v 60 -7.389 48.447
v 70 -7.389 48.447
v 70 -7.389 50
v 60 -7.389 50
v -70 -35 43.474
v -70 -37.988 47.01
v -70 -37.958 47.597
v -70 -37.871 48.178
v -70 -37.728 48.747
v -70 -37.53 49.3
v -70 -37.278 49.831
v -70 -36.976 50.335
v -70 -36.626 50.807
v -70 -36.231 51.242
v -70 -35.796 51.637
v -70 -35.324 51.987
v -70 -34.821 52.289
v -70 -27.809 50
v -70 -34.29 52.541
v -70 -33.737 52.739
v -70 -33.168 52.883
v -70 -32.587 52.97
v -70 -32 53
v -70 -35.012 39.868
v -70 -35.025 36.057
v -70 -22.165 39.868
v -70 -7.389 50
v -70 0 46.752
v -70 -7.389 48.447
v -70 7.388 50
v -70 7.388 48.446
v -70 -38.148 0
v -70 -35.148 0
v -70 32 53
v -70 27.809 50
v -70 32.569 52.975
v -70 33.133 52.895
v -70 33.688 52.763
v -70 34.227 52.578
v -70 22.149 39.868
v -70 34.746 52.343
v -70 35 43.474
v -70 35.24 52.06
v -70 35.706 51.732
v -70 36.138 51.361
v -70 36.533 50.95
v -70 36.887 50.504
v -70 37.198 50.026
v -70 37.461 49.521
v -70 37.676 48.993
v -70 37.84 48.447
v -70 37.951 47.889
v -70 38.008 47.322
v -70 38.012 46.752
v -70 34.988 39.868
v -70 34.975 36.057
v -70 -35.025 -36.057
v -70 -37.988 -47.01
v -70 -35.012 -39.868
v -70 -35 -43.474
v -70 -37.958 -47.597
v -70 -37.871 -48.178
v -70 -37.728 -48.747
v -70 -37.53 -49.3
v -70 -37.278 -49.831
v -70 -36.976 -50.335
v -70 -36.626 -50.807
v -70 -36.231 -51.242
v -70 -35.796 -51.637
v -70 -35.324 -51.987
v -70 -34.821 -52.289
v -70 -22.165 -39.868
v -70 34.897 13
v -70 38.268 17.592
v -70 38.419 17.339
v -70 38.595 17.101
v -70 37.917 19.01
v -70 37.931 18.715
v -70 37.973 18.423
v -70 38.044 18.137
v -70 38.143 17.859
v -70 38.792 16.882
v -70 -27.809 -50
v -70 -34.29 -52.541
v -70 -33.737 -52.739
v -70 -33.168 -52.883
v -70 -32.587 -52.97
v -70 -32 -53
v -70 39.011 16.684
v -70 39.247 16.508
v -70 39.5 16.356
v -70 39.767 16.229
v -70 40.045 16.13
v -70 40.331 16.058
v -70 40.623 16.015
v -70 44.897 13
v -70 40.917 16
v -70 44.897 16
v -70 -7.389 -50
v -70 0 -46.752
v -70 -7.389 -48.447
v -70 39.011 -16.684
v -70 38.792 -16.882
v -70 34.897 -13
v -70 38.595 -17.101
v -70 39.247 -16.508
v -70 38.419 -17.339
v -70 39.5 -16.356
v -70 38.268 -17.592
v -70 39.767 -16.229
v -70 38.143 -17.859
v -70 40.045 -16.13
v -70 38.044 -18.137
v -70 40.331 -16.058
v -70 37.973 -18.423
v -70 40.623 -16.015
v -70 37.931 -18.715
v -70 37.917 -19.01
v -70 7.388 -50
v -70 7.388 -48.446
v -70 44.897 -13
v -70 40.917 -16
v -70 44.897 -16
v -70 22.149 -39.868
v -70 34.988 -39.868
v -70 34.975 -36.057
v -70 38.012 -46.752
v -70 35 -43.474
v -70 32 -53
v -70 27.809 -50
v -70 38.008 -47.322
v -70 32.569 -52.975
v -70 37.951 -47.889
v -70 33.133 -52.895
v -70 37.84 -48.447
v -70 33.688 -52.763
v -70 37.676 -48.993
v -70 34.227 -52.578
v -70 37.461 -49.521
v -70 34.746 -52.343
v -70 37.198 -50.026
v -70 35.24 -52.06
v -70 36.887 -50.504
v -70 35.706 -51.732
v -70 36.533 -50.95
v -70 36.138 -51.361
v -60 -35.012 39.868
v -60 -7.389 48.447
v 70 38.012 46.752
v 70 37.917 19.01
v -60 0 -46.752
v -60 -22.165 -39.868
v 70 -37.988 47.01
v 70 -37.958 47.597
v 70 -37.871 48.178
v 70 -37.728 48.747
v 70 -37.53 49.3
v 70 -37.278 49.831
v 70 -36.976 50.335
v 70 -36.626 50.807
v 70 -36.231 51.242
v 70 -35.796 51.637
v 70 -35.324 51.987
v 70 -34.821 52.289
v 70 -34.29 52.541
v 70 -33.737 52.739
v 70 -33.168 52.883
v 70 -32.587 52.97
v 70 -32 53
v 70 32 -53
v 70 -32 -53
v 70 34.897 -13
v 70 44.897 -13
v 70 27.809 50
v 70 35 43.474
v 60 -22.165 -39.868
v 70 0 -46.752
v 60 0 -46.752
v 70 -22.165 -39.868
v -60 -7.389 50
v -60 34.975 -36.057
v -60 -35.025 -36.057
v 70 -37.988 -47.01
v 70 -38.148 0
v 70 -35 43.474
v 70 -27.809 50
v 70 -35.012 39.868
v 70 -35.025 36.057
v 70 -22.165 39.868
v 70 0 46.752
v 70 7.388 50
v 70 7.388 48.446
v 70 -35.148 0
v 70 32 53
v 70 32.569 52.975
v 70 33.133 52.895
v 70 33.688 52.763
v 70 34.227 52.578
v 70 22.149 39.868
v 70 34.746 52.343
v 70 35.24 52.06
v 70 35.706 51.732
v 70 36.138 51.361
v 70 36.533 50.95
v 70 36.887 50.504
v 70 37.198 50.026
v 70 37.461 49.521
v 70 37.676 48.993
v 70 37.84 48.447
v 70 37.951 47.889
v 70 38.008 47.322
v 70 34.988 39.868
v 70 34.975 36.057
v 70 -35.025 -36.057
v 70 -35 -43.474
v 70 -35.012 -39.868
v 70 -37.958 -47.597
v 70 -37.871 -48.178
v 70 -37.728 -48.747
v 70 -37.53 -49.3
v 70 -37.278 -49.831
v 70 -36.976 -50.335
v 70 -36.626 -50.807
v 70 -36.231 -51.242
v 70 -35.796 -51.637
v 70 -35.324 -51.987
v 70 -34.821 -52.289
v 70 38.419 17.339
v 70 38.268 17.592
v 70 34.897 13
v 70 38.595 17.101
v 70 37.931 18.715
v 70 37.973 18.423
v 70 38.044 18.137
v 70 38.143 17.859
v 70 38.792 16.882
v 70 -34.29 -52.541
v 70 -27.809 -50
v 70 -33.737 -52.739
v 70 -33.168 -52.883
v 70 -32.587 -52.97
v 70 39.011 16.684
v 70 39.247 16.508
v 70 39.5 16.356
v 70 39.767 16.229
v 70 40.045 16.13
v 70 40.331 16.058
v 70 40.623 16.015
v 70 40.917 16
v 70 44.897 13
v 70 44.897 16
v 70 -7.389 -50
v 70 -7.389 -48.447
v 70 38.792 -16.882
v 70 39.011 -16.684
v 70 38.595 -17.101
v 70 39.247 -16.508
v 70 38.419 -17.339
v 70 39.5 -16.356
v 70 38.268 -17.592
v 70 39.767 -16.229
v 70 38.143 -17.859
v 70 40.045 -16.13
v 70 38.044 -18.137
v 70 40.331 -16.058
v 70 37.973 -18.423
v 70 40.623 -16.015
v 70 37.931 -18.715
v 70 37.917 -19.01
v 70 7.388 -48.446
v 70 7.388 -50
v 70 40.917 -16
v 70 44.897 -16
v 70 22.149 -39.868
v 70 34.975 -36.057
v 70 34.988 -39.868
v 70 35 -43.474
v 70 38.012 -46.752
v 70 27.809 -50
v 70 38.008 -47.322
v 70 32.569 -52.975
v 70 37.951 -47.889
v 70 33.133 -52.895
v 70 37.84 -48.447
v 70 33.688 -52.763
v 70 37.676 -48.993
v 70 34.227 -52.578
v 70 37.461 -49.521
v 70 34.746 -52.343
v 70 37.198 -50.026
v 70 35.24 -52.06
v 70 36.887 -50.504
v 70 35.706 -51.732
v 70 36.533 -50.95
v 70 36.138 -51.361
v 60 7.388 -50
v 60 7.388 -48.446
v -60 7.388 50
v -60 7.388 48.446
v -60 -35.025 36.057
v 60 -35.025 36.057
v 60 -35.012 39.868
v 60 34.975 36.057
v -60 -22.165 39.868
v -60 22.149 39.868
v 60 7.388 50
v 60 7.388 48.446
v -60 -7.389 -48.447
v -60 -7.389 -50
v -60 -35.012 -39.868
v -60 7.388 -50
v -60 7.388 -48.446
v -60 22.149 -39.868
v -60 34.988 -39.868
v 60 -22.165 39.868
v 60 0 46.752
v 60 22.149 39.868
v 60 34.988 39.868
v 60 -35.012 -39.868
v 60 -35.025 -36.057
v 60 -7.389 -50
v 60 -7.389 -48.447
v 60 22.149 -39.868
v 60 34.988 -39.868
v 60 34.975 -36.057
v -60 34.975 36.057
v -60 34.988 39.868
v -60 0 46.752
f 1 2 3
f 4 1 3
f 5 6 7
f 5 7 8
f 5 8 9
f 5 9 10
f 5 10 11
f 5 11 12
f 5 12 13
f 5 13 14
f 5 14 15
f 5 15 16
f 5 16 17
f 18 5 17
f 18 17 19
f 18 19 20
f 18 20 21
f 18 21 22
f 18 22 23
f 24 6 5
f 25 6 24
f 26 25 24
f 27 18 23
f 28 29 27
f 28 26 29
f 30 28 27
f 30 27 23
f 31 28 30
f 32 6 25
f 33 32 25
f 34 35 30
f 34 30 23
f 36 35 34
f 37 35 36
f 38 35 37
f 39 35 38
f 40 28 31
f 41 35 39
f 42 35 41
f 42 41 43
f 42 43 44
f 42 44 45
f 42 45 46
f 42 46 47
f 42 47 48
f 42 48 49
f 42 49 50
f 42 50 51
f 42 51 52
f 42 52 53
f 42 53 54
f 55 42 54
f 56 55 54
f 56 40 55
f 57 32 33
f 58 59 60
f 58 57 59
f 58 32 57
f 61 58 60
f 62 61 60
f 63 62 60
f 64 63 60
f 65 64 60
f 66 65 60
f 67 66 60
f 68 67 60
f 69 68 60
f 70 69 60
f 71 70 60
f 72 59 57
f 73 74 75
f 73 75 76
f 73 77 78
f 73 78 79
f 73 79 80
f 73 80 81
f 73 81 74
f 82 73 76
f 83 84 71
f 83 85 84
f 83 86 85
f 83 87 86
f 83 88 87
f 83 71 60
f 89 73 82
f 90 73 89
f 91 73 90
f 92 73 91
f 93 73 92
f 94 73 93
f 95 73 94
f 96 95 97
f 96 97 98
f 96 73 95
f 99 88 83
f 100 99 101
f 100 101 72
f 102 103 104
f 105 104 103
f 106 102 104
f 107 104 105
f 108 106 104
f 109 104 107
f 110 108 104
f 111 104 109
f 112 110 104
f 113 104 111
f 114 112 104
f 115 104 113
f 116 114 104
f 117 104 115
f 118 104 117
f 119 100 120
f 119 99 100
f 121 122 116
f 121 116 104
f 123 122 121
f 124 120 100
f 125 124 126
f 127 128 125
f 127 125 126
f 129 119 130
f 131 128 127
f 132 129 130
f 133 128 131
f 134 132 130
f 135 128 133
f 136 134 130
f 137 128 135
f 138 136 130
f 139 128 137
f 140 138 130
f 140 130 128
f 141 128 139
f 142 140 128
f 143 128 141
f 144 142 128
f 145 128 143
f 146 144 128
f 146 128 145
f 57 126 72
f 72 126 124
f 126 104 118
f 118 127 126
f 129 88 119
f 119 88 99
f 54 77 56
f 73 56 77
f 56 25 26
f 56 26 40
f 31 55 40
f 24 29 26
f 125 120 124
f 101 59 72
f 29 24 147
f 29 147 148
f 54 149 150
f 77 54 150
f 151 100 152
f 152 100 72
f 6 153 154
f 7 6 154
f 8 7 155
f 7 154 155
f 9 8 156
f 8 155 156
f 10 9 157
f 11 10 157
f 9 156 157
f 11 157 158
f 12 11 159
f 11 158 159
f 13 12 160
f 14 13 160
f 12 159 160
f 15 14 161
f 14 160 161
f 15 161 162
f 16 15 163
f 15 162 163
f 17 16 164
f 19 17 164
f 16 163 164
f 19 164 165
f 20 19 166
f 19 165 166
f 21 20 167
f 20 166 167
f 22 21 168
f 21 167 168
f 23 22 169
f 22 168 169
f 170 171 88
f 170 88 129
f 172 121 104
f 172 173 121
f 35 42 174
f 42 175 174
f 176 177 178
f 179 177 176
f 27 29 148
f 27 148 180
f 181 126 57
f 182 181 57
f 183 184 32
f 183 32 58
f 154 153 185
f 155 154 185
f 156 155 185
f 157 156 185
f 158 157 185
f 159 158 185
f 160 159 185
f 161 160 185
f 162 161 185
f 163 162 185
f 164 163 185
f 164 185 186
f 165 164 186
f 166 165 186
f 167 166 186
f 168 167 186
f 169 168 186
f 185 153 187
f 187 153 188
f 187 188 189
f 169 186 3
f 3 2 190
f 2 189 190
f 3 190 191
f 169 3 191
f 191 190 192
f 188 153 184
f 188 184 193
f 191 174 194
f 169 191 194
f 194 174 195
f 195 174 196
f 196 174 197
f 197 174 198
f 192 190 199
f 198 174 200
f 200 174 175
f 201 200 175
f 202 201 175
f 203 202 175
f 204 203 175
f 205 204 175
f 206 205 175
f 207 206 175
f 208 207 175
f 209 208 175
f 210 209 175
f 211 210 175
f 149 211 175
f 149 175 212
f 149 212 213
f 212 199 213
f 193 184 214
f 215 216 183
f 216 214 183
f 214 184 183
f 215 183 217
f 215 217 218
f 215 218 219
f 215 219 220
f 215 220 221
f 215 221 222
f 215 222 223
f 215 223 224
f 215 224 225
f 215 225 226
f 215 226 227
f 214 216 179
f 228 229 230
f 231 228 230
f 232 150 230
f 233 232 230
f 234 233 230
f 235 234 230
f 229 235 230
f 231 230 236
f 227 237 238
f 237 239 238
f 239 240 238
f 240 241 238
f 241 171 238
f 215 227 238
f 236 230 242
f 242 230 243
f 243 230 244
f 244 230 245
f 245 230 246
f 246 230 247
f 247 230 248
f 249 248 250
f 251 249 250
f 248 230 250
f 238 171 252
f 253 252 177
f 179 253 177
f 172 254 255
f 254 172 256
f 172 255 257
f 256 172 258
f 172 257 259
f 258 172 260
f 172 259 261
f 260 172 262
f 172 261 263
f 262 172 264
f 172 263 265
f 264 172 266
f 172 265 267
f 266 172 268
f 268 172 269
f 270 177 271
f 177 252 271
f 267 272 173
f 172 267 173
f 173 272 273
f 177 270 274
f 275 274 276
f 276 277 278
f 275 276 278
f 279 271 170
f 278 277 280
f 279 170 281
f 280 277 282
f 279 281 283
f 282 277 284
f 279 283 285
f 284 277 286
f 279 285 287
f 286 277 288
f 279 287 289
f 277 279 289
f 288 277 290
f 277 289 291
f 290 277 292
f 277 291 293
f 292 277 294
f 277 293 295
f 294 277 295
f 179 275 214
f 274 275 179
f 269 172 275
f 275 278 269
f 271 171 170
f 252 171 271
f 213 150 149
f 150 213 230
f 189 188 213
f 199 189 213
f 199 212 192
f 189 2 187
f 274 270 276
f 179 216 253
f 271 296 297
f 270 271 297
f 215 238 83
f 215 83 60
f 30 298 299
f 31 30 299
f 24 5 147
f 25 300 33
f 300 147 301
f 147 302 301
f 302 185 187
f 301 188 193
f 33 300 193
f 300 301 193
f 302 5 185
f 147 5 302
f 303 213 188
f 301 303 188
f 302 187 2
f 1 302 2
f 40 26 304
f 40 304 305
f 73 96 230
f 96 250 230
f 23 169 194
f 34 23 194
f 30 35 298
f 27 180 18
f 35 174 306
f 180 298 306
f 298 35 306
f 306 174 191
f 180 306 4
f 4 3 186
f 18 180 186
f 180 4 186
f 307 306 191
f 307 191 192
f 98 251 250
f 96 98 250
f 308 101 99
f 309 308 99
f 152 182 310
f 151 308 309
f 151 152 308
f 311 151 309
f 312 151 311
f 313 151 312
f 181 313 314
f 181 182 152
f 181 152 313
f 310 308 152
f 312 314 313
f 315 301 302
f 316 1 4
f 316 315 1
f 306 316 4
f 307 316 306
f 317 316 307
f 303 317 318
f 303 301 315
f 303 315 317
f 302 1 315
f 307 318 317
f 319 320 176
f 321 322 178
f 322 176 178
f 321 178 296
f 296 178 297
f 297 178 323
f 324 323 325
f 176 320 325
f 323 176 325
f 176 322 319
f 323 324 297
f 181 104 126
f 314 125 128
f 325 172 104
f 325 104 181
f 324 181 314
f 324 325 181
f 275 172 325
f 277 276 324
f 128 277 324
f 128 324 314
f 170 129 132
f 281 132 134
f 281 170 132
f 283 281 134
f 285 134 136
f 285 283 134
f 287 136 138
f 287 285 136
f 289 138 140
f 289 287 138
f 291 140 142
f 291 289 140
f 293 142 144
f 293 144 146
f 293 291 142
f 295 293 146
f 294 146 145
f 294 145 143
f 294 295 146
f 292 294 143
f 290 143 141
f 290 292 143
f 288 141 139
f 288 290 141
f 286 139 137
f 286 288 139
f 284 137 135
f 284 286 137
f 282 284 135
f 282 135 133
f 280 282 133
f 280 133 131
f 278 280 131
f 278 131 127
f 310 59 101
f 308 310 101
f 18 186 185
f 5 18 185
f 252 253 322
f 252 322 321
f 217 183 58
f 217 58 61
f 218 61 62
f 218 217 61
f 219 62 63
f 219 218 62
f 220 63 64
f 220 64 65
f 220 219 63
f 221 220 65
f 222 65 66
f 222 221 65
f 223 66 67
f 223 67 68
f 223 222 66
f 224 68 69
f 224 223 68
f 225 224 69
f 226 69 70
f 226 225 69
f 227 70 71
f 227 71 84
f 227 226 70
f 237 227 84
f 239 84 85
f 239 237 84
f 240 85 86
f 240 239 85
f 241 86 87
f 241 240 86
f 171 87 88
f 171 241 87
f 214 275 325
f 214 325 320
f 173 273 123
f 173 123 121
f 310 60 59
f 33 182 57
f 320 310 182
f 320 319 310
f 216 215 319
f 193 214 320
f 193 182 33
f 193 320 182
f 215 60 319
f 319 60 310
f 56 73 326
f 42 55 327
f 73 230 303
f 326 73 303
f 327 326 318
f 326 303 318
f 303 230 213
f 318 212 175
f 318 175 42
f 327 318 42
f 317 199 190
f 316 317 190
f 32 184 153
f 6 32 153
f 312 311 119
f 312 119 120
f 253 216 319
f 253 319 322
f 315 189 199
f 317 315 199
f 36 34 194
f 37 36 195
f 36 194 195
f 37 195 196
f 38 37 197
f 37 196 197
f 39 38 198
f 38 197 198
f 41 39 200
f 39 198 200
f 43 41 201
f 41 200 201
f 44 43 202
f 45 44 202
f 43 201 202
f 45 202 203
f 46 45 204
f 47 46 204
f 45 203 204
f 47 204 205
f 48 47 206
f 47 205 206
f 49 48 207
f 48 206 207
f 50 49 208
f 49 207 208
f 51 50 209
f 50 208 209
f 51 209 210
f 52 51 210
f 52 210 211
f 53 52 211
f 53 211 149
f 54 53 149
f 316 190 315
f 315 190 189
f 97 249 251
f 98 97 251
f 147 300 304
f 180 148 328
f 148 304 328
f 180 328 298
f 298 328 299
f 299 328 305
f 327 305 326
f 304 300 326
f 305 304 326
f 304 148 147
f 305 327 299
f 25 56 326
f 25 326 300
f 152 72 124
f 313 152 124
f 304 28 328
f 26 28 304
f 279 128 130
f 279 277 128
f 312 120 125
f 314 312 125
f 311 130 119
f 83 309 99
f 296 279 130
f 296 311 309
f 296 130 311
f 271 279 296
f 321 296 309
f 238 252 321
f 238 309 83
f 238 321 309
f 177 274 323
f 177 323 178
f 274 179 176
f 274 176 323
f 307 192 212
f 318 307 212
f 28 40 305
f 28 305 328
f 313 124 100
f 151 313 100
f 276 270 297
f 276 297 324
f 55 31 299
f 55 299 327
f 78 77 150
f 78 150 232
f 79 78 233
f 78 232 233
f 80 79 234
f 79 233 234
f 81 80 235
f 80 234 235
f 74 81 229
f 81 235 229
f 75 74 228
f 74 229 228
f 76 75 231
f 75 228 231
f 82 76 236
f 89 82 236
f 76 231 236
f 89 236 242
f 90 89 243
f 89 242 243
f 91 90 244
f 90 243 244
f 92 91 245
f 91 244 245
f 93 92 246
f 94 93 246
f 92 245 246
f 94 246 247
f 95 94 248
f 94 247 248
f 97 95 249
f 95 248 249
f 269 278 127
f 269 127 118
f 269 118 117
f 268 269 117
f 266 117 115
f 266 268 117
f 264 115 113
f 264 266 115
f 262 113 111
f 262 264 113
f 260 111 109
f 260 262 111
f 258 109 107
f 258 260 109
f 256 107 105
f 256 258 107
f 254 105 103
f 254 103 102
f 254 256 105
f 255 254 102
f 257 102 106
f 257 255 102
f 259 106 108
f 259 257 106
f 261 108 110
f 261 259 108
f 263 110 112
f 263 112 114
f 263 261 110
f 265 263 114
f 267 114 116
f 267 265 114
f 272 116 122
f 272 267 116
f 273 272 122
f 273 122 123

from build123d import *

# Parameters (mm, degrees)
F1_DEPTH = 70
F3_DEPTH = 10


# Not quite as in the source:
# - a feature names something its author has since deleted; it is built from what else it names


with BuildPart() as f1:
    # F0 (on Right) → F1 (new body)
    with BuildSketch(Plane.YZ):
        with BuildLine():
            Line((35.0004041982, -43.4744954109), (27.8094485444, -50))
            Line((27.8094485444, -50), (-27.8090443462, -50))
            Line((-27.8090443462, -50), (-35, -43.4744954109))
            Line((-35, -43.4744954109), (-35.1477400841, 0))
            Line((-35.1477400841, 0), (-38.1477574069, 0))
            Line((-38.1477574069, 0), (-37.988001967, -47.0101745328))
            ThreePointArc((-37.988001967, -47.0101745328), (-36.2312971095, -51.2420067187), (-32, -53))
            Line((-32, -53), (32, -53))
            ThreePointArc((32, -53), (36.3403848268, -51.1600325097), (38.0115591918, -46.7519039894))
            Line((38.0115591918, -46.7519039894), (37.917284091, -19.0101948899))
            ThreePointArc((37.917284091, -19.0101948899), (38.792345044, -16.8822871618), (40.9172667684, -16))
            Line((40.9172667684, -16), (44.8968422253, -16))
            Line((44.8968422253, -16), (44.8968422253, -13))
            Line((44.8968422253, -13), (34.8968422253, -13))
            Line((34.8968422253, -13), (35.0004041982, -43.4744954109))
        make_face()
    extrude(amount=F1_DEPTH)

    # F2 (on face) → F3 (join)
    with BuildSketch(Plane.YZ.offset(70)):
        Polygon((34.9751985597, -36.0573992247), (-35.0252056385, -36.0573992247), (-35.0122565756, -39.8678341294), (-7.3888426073, -48.4471021518), (-7.3888426073, -50), (-2.3888426073, -50), (2.3879472654, -50), (7.3879472654, -50), (7.3879472654, -48.4459963804), (34.9881476226, -39.8678341294), align=None)
        Polygon((0, -46.7519039894), (-22.1652372944, -39.8678341294), (22.1494653338, -39.8678341294), align=None, mode=Mode.SUBTRACT)
    extrude(amount=-F3_DEPTH)

    # F4: F1 across plane


with BuildPart() as f1_1:
    add(f1.part)
    add(f1.part.mirror(Plane.YZ))

    # F5: F1 across plane


with BuildPart() as f1_2:
    add(f1_1.part)
    add(f1_1.part.mirror(Plane.XY))


solid = f1_2.part
